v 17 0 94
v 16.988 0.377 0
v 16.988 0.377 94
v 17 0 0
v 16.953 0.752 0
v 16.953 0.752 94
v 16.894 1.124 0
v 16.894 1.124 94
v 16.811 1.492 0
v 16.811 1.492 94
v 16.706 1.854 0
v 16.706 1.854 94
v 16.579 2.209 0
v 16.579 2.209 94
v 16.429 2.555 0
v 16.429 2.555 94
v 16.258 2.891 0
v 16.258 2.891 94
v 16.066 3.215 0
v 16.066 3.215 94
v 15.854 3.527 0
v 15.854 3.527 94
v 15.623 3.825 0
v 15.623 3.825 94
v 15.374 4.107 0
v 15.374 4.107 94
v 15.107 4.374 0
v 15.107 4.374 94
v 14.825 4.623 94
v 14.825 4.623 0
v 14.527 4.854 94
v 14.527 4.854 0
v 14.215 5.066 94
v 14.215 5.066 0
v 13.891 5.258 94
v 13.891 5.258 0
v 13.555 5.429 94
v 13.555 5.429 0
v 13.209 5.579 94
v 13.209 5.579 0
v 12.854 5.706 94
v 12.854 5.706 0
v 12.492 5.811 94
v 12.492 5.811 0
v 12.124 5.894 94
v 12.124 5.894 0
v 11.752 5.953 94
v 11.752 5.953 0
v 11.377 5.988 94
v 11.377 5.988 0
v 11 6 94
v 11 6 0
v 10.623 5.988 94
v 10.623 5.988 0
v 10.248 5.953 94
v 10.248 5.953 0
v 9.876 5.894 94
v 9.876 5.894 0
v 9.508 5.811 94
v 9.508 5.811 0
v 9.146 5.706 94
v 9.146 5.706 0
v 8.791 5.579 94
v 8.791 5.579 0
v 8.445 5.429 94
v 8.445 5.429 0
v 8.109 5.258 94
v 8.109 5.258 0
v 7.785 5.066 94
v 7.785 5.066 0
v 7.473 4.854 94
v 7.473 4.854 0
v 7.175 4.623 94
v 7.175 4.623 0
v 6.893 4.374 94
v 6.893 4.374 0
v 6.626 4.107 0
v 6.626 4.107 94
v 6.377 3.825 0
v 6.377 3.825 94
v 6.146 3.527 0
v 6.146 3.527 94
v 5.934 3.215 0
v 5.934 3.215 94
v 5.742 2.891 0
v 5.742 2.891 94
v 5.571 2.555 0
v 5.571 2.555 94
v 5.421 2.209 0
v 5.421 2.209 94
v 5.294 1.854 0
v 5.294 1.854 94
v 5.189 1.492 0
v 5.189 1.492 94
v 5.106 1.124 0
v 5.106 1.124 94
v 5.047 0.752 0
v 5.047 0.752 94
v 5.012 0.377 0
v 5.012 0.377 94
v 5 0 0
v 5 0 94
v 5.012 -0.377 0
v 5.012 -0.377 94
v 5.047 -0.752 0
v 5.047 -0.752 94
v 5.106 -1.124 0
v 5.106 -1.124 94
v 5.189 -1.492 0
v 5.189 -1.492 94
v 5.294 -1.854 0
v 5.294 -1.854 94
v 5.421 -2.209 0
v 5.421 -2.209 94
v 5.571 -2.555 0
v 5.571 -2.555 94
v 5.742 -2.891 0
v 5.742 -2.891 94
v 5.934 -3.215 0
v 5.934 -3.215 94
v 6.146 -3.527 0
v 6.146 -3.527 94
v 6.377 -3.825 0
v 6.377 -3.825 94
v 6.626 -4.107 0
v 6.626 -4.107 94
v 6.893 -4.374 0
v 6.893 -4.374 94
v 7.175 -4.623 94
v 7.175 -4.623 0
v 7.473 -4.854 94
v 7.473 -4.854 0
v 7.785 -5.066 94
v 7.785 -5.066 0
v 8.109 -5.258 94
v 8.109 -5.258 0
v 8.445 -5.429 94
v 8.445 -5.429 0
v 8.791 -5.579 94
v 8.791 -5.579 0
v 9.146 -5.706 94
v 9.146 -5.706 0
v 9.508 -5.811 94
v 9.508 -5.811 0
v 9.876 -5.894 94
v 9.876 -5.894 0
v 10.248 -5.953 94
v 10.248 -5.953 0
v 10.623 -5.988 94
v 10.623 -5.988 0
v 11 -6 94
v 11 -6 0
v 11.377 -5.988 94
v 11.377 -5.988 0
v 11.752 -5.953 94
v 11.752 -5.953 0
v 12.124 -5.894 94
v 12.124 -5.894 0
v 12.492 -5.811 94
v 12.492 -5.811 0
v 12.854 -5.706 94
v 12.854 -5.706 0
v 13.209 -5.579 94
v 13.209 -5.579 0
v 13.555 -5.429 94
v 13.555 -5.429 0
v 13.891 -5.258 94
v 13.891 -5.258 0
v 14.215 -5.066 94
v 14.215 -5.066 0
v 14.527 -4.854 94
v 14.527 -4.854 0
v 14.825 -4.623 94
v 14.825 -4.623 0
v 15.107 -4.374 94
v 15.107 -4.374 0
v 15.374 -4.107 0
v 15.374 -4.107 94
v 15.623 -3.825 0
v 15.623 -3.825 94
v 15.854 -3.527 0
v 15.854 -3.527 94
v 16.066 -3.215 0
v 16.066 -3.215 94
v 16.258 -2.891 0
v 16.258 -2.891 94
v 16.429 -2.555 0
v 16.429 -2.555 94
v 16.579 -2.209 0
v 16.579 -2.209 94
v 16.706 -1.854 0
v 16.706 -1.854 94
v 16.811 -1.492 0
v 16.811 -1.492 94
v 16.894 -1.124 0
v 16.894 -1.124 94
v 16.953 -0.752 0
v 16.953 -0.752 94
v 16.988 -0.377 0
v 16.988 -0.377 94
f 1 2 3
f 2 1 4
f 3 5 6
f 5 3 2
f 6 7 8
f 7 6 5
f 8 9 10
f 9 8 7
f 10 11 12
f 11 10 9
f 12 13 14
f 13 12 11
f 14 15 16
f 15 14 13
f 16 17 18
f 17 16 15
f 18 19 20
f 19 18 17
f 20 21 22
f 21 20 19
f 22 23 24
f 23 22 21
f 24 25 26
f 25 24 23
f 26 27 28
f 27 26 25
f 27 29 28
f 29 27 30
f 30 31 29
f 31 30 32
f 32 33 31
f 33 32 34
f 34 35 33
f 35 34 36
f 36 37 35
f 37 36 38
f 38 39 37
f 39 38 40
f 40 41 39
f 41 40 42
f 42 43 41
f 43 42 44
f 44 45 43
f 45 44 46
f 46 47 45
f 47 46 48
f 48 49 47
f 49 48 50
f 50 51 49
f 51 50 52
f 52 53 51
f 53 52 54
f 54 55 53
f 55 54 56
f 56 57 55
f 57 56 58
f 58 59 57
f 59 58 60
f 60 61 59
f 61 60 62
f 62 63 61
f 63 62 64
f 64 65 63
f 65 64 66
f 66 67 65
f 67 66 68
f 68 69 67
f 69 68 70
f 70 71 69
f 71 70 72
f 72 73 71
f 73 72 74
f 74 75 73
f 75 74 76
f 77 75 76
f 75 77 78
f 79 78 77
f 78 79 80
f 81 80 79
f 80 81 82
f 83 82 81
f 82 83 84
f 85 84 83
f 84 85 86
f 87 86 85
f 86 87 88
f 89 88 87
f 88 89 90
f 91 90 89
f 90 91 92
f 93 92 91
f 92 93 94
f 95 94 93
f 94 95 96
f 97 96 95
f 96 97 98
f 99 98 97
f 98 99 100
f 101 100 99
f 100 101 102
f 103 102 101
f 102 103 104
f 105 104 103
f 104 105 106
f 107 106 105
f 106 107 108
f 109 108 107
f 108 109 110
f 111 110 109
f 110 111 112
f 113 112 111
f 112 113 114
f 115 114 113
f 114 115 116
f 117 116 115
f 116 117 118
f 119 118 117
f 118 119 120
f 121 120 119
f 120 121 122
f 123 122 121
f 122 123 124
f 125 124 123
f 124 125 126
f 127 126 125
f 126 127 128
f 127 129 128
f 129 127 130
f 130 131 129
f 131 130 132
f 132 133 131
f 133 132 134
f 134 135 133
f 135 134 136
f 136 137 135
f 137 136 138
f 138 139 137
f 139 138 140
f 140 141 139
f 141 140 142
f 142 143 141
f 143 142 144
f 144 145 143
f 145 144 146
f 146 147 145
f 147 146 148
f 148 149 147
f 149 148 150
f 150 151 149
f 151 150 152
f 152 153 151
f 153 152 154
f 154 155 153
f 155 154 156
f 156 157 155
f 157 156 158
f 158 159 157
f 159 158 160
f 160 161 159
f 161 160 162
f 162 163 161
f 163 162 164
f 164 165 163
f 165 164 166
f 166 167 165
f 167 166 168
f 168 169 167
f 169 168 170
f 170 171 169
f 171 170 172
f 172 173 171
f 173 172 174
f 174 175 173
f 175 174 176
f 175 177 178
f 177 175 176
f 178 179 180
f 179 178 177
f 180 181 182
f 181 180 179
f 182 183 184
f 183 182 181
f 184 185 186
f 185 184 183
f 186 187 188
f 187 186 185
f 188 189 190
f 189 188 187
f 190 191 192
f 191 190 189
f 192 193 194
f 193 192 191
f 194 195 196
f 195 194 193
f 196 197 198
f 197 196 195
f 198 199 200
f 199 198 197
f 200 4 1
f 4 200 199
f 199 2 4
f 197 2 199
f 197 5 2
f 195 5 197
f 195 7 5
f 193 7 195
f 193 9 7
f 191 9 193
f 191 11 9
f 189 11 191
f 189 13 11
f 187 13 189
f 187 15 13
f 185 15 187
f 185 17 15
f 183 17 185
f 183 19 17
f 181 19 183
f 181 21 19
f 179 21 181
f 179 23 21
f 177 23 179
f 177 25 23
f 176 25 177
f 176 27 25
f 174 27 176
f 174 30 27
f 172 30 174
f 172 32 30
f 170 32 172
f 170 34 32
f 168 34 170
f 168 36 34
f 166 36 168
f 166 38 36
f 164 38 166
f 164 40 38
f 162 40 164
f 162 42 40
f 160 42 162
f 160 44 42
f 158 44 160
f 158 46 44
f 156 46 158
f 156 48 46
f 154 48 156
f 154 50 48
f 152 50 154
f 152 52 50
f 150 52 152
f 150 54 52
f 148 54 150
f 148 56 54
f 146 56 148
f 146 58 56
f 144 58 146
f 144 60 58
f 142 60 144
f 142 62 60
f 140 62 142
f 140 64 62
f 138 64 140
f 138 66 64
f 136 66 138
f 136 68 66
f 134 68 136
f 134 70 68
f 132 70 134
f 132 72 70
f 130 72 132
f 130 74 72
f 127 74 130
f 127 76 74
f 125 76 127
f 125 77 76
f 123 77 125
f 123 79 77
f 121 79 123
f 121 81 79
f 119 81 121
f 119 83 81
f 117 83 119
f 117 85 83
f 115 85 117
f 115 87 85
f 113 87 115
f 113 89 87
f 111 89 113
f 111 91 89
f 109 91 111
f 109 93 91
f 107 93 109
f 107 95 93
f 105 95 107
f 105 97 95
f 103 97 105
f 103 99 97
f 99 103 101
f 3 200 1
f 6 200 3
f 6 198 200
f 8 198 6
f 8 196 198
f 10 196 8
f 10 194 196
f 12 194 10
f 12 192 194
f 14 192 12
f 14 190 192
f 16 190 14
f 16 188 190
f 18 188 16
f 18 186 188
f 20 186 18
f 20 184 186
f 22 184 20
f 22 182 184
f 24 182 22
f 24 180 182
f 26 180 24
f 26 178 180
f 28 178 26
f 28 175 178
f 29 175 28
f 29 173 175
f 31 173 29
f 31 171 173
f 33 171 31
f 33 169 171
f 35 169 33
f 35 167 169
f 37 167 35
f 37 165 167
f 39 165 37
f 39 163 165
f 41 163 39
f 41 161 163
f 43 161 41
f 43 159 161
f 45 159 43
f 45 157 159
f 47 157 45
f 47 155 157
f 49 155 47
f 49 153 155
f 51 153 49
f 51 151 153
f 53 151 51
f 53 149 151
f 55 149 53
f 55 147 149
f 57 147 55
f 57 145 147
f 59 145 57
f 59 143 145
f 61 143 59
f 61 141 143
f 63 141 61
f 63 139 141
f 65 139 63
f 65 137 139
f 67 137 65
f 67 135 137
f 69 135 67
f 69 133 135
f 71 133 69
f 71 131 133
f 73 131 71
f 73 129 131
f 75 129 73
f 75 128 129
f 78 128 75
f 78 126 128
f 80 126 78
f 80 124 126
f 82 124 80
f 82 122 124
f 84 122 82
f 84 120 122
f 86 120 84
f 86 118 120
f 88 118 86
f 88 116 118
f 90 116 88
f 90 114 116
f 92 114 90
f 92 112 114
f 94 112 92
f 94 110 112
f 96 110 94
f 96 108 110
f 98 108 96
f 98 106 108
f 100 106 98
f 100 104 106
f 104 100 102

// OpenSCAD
$fn = 100;

// Parametres des cerlces
rayon_ext = 9 ; // rayon extérieur des cercles
epaisseur_c = 2 ;
rayon_int = rayon_ext - epaisseur_c ; // rayon extérieur des cercles
hauteur_c = 2;

// paramètres des étages
hauteur_e = 4;
dec_centre = 11; // décalage des cercles par rapport au centre

// paramètres des tubes
hauteur_t = 44;
rayon_t = 8;
epaisseur_tube = 2;
rayon_t_int = rayon_t - epaisseur_tube;

tab_cercle = [3,9,15,21,27,33,39];

///// Pour tester les modules
//cercle(height = hauteur_c, radius_ext = rayon_ext, radius_int = rayon_int);
// cercle(height = 5, radius_ext = 3, radius_int = 2);
//etage(height=hauteur_e,radius=rayon_ext,radius_rect=10,shift=dec_centre);
//tube(height_tube=hauteur_t,height_circle=hauteur_c,tube_radius=rayon_t,tube_radius_int=rayon_t_int,radius_ext=rayon_ext,radius_int=rayon_int,circle_tab=tab_cercle);
//tritube_plein();

/* Parametres lors des tests
height = hauteur_e;
radius = rayon_ext;
radius_rect = 10;

height_tube = hauteur_t;
height_circle = hauteur_c;
tube_radius = rayon_t;
tube_radius_int = rayon_t_int;
radius_ext = rayon_ext;
radius_int = rayon_int;
*/

//translate([dec_centre,0,0])cylinder(hauteur_t,rayon_t_int,rayon_t_int); // 1 section
translate([dec_centre,0,0])cylinder(hauteur_t*2+6,rayon_t_int,rayon_t_int); // 2 sections

 module tritube()
 {
     translate([0,0,3])union(){
        translate([dec_centre,0,0])tube(height_tube=hauteur_t,height_circle=hauteur_c,tube_radius=rayon_t,tube_radius_int=rayon_t_int,radius_ext=rayon_ext,radius_int=rayon_int,circle_tab=tab_cercle);
        rotate([0,0,120])translate([dec_centre,0,0])tube(height_tube=hauteur_t,height_circle=hauteur_c,tube_radius=rayon_t,tube_radius_int=rayon_t_int,radius_ext=rayon_ext,radius_int=rayon_int,circle_tab=tab_cercle);
        rotate([0,0,240])translate([dec_centre,0,0])tube(height_tube=hauteur_t,height_circle=hauteur_c,tube_radius=rayon_t,tube_radius_int=rayon_t_int,radius_ext=rayon_ext,radius_int=rayon_int,circle_tab=tab_cercle);
    }
}

module tube(height_tube,height_circle,tube_radius,tube_radius_int,radius_ext,radius_int,circle_tab)
{
    difference(){
        cylinder(height_tube,tube_radius,tube_radius);
        translate([0,0,-1])cylinder(height_tube+5,tube_radius_int,tube_radius_int);
            for ($repetitions = tab_cercle)
        {
            translate([0, 0, $repetitions])cercle(height = hauteur_c, radius_ext = rayon_ext, radius_int = rayon_int+0.5);
        }
    }
}

module etage(height,radius,radius_rect,shift)
{
    union(){
        translate([shift,0,0])cylinder(height,radius,radius);
        rotate([0,0,120])translate([shift,0,0])cylinder(height,radius,radius);
        rotate([0,0,240])translate([shift,0,0])cylinder(height,radius,radius);

        rotate([0,0,180])translate([shift/2-1,-radius_rect,0])cube(size = [radius_rect,radius_rect*2,height]);
        rotate([0,0,60])translate([shift/2-5,-radius_rect+5,0])cube(size = [radius_rect,radius_rect,height]);
        rotate([0,0,-60])translate([shift/2-5,-radius_rect+5,0])cube(size = [radius_rect,radius_rect,height]);
        translate([-radius_rect/2,-radius_rect/2,0])cube(size = [radius_rect,radius_rect,height]);
    }
}


module cercle(height,radius_ext,radius_int) 
{
    difference(){
    cylinder(height,radius_ext,radius_ext);
    translate([0,0,-1])cylinder(height+2,radius_int,radius_int);
    }
}
